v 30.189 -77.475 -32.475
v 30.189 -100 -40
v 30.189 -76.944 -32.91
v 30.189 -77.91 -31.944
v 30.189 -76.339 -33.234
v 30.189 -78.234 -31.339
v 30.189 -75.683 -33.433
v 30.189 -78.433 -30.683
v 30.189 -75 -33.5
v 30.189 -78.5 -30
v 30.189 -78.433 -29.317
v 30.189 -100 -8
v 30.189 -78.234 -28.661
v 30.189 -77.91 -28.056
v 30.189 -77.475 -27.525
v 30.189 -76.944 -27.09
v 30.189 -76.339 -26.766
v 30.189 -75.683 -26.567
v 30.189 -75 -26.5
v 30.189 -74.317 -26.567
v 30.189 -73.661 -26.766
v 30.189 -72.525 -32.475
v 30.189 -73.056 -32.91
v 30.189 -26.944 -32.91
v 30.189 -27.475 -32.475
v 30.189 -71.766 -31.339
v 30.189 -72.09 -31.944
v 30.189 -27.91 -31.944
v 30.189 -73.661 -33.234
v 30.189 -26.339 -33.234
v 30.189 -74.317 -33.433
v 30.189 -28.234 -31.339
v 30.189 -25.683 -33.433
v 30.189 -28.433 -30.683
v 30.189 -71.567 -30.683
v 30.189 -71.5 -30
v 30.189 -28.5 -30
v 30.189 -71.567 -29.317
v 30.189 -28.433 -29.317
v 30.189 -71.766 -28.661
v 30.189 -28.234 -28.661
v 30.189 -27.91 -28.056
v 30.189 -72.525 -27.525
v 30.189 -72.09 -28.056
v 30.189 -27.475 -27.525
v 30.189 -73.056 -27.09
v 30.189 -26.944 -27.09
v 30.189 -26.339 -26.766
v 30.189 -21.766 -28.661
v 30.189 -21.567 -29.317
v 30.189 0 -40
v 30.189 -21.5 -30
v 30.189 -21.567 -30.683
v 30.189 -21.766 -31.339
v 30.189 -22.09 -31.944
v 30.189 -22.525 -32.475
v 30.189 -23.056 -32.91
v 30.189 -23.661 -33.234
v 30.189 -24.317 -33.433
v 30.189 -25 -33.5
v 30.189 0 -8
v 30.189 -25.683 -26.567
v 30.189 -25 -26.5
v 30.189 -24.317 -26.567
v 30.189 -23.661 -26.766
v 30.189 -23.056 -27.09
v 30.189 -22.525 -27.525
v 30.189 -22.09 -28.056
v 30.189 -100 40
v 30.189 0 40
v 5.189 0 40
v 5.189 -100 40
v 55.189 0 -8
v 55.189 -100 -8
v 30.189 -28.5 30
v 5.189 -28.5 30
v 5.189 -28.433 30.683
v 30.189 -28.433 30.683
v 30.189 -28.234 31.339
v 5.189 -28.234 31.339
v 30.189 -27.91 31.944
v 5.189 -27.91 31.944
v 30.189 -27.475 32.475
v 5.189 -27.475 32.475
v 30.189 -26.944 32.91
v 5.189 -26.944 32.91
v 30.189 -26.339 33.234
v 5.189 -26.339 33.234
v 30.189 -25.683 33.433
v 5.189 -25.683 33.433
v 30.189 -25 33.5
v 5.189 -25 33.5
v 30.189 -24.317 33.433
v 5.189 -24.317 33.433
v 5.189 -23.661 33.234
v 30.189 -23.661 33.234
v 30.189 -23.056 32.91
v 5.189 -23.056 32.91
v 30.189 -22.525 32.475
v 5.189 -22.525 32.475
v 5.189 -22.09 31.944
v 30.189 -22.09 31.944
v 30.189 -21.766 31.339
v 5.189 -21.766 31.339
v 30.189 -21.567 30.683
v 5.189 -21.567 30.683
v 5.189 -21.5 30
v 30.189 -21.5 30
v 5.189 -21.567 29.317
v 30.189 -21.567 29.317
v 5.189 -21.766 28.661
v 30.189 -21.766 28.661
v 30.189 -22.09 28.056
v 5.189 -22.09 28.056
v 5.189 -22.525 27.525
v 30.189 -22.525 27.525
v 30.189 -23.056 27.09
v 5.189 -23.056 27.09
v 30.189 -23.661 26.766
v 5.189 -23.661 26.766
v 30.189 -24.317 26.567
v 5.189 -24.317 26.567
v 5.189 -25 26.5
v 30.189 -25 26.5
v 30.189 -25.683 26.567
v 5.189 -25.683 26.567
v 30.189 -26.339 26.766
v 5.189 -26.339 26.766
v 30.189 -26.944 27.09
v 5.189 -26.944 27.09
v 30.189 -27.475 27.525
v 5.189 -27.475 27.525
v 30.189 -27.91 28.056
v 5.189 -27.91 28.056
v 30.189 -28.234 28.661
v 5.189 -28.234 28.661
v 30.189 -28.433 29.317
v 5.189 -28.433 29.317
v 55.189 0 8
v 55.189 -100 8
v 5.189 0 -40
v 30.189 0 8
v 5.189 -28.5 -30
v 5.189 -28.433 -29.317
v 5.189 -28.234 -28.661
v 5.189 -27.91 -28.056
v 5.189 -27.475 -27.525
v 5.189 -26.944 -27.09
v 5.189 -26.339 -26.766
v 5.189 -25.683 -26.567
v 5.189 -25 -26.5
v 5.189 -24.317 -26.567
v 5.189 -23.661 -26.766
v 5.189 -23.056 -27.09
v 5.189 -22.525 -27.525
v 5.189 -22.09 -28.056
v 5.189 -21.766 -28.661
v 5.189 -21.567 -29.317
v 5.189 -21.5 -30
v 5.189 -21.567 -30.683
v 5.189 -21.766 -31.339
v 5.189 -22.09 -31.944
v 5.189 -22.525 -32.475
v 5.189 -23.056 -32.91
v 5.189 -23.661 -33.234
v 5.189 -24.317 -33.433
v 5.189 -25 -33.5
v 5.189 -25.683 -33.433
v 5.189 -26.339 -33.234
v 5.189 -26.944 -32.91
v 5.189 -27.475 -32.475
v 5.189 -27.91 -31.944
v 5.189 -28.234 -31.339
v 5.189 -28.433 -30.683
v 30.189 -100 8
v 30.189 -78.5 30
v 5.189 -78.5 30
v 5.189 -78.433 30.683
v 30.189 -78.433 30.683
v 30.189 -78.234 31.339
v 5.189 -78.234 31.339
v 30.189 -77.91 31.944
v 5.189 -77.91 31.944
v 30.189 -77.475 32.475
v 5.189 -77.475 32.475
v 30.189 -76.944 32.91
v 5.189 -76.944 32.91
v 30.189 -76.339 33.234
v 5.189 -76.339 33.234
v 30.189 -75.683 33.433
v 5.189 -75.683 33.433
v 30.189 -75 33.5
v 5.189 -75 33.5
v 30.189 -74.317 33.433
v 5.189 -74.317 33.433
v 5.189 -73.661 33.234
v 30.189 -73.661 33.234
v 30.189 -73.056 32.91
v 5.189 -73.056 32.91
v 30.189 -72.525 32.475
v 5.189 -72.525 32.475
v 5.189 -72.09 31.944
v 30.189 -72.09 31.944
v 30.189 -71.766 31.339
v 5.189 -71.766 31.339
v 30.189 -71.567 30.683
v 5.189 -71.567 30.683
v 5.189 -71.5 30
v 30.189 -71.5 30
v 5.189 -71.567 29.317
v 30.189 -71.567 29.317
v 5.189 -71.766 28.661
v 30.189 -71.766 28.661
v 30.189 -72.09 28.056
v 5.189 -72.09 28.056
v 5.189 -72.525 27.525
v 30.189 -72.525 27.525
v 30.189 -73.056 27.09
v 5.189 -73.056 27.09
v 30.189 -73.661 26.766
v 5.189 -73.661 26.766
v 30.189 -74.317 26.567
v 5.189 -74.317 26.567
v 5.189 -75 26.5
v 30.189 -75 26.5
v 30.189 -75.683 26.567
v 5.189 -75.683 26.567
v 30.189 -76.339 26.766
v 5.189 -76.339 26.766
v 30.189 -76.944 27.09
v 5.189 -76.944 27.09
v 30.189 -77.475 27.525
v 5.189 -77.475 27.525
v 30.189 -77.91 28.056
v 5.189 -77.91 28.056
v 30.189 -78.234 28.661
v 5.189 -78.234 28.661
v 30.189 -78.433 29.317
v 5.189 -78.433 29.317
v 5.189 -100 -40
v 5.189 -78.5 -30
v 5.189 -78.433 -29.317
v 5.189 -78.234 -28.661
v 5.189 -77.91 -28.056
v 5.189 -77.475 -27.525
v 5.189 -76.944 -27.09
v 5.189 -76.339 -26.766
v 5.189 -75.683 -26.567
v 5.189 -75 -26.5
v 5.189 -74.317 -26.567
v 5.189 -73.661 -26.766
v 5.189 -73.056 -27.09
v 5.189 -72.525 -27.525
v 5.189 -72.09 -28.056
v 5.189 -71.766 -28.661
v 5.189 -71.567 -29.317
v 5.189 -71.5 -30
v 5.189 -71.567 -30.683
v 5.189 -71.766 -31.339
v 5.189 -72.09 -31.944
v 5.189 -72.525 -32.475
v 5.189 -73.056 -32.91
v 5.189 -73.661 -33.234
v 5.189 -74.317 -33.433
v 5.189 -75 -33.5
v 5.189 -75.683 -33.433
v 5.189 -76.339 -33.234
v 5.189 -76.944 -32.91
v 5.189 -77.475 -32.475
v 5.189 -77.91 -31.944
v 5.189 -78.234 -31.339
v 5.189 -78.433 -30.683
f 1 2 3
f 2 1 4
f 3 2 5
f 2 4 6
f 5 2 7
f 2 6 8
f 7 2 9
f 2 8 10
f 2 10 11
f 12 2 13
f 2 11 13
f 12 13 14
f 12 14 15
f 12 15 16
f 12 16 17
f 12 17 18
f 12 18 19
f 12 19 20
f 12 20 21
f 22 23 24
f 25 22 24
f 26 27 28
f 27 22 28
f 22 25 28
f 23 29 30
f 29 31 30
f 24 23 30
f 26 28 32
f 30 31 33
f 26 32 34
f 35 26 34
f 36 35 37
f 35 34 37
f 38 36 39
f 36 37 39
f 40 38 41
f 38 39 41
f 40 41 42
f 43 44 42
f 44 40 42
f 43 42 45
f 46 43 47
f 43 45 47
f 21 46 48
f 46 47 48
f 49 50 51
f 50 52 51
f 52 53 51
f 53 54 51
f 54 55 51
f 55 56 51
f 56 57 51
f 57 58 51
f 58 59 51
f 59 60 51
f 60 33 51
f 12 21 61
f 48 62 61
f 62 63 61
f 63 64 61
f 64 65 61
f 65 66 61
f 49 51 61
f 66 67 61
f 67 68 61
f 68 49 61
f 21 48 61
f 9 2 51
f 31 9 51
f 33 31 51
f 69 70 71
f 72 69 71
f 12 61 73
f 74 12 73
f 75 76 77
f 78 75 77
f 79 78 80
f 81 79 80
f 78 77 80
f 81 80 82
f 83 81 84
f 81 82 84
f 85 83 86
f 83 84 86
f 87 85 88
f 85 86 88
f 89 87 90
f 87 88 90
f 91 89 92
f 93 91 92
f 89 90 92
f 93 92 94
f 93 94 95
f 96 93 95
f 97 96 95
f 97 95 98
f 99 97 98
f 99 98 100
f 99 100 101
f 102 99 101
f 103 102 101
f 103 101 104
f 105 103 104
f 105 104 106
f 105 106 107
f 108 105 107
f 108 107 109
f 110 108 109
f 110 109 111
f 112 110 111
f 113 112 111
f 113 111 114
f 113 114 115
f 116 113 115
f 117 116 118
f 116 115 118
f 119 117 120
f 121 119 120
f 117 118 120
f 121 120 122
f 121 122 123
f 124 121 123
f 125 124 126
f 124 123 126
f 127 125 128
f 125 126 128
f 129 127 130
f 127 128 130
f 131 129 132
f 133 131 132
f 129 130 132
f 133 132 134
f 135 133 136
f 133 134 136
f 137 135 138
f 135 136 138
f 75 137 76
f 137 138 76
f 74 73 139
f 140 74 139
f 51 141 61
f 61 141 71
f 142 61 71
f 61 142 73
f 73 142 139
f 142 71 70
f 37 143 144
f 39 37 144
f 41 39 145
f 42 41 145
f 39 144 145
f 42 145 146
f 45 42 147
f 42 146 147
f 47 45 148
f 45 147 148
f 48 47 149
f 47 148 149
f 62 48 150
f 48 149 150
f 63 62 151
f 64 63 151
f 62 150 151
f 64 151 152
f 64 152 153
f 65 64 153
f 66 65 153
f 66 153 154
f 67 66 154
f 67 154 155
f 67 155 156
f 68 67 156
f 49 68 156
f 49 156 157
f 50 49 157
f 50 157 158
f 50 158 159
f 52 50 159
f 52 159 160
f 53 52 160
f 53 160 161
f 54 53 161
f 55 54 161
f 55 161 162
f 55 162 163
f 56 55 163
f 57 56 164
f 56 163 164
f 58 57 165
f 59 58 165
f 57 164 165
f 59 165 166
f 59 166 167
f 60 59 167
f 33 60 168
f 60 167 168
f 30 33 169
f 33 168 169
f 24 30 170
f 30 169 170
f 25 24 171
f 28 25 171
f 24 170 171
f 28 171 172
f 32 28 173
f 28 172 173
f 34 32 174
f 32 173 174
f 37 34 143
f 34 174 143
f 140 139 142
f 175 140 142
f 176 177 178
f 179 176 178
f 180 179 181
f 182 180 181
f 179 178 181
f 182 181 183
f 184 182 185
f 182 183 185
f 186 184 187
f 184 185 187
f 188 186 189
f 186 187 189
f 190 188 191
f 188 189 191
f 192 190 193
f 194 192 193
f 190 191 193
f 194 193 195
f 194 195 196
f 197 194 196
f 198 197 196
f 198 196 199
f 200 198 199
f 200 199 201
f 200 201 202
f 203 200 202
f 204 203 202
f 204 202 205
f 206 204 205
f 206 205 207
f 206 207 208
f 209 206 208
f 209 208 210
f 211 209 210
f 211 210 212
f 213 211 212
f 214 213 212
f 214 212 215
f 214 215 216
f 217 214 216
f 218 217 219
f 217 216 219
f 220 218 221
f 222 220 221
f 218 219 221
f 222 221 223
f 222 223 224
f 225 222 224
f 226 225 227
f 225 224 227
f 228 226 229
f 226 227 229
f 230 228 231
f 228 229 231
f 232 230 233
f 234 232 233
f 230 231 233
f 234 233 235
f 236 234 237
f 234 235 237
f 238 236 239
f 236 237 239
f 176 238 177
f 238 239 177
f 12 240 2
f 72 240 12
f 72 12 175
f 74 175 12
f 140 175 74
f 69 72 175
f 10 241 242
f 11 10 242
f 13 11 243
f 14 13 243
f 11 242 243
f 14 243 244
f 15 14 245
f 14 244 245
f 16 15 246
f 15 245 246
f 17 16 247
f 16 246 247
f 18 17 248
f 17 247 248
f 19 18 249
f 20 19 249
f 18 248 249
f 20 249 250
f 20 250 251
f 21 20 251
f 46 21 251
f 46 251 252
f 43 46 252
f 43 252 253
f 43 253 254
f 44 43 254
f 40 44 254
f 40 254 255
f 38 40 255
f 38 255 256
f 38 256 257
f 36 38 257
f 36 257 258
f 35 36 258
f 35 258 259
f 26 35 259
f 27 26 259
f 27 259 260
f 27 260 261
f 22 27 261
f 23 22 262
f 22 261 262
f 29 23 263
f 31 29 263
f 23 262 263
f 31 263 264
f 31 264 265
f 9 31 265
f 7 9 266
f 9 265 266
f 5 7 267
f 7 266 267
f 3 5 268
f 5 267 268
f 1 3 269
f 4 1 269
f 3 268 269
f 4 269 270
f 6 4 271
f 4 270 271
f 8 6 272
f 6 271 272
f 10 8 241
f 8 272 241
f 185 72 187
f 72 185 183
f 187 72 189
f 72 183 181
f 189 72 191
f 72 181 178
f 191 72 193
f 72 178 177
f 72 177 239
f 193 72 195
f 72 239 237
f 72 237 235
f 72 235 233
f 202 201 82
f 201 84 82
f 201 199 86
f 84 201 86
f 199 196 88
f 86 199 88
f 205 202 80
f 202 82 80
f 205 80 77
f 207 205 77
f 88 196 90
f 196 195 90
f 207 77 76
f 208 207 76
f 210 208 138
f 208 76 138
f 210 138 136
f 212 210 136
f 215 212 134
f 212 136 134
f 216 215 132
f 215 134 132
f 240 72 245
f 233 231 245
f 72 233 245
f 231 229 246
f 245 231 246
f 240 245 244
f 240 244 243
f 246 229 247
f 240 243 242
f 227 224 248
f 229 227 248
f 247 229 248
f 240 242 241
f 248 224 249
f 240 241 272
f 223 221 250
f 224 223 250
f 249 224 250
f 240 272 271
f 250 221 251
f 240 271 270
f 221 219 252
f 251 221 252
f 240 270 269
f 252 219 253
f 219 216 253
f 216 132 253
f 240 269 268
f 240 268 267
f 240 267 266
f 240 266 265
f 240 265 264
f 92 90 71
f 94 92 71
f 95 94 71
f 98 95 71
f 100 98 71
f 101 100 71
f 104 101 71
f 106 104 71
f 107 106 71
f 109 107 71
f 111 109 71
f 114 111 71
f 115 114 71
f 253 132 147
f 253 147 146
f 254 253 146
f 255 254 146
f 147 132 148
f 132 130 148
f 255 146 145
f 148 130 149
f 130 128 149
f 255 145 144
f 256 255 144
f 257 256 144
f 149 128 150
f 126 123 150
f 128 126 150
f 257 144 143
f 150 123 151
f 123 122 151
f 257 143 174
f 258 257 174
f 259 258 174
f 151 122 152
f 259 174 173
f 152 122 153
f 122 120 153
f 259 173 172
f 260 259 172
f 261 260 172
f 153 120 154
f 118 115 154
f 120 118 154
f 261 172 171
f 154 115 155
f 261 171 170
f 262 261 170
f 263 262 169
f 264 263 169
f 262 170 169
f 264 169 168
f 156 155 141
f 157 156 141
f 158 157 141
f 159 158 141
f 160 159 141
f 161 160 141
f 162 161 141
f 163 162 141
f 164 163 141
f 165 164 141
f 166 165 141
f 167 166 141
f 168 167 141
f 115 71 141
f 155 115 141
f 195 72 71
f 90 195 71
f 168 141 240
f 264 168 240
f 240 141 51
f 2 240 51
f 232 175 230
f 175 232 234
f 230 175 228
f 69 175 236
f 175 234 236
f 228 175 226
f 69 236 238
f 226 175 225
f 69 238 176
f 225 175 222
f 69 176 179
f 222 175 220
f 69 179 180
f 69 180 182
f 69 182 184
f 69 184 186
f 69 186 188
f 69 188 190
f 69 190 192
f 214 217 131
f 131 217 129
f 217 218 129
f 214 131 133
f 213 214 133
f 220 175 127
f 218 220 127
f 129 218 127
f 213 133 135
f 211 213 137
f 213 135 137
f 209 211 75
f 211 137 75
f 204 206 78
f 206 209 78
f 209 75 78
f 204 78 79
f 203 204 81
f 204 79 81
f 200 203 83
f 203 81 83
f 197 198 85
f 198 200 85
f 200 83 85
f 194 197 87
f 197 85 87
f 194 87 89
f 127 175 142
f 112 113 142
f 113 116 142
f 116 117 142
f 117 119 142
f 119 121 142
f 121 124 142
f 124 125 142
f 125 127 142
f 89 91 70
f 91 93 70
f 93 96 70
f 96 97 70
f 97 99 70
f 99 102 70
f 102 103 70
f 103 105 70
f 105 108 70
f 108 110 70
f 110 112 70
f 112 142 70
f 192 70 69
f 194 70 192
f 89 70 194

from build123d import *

# Parameters (mm, degrees)
F1_DEPTH = 100
F2_R     = 3.5
F3_DEPTH = 100


with BuildPart() as f1:
    # F0 (on Front) → F1 (new body)
    with BuildSketch(Plane.XZ):
        Polygon((5.189254, 40), (5.189254, 0), (5.189254, -40), (30.189254, -40), (30.189254, -8), (55.189254, -8), (55.189254, 8), (30.189254, 8), (30.189254, 40), align=None)
    extrude(amount=F1_DEPTH)

    # F2 (on face) → F3 (cut)
    with BuildSketch(Plane(origin=(5.189254, 0, 0), x_dir=(0, -1, 0), z_dir=(-1, 0, 0))):
        with Locations((25, 30)):
            Circle(F2_R)
        with Locations((75, 30)):
            Circle(F2_R)
        with Locations((25, -30)):
            Circle(F2_R)
        with Locations((75, -30)):
            Circle(F2_R)
    extrude(amount=-F3_DEPTH, mode=Mode.SUBTRACT)


solid = f1.part
